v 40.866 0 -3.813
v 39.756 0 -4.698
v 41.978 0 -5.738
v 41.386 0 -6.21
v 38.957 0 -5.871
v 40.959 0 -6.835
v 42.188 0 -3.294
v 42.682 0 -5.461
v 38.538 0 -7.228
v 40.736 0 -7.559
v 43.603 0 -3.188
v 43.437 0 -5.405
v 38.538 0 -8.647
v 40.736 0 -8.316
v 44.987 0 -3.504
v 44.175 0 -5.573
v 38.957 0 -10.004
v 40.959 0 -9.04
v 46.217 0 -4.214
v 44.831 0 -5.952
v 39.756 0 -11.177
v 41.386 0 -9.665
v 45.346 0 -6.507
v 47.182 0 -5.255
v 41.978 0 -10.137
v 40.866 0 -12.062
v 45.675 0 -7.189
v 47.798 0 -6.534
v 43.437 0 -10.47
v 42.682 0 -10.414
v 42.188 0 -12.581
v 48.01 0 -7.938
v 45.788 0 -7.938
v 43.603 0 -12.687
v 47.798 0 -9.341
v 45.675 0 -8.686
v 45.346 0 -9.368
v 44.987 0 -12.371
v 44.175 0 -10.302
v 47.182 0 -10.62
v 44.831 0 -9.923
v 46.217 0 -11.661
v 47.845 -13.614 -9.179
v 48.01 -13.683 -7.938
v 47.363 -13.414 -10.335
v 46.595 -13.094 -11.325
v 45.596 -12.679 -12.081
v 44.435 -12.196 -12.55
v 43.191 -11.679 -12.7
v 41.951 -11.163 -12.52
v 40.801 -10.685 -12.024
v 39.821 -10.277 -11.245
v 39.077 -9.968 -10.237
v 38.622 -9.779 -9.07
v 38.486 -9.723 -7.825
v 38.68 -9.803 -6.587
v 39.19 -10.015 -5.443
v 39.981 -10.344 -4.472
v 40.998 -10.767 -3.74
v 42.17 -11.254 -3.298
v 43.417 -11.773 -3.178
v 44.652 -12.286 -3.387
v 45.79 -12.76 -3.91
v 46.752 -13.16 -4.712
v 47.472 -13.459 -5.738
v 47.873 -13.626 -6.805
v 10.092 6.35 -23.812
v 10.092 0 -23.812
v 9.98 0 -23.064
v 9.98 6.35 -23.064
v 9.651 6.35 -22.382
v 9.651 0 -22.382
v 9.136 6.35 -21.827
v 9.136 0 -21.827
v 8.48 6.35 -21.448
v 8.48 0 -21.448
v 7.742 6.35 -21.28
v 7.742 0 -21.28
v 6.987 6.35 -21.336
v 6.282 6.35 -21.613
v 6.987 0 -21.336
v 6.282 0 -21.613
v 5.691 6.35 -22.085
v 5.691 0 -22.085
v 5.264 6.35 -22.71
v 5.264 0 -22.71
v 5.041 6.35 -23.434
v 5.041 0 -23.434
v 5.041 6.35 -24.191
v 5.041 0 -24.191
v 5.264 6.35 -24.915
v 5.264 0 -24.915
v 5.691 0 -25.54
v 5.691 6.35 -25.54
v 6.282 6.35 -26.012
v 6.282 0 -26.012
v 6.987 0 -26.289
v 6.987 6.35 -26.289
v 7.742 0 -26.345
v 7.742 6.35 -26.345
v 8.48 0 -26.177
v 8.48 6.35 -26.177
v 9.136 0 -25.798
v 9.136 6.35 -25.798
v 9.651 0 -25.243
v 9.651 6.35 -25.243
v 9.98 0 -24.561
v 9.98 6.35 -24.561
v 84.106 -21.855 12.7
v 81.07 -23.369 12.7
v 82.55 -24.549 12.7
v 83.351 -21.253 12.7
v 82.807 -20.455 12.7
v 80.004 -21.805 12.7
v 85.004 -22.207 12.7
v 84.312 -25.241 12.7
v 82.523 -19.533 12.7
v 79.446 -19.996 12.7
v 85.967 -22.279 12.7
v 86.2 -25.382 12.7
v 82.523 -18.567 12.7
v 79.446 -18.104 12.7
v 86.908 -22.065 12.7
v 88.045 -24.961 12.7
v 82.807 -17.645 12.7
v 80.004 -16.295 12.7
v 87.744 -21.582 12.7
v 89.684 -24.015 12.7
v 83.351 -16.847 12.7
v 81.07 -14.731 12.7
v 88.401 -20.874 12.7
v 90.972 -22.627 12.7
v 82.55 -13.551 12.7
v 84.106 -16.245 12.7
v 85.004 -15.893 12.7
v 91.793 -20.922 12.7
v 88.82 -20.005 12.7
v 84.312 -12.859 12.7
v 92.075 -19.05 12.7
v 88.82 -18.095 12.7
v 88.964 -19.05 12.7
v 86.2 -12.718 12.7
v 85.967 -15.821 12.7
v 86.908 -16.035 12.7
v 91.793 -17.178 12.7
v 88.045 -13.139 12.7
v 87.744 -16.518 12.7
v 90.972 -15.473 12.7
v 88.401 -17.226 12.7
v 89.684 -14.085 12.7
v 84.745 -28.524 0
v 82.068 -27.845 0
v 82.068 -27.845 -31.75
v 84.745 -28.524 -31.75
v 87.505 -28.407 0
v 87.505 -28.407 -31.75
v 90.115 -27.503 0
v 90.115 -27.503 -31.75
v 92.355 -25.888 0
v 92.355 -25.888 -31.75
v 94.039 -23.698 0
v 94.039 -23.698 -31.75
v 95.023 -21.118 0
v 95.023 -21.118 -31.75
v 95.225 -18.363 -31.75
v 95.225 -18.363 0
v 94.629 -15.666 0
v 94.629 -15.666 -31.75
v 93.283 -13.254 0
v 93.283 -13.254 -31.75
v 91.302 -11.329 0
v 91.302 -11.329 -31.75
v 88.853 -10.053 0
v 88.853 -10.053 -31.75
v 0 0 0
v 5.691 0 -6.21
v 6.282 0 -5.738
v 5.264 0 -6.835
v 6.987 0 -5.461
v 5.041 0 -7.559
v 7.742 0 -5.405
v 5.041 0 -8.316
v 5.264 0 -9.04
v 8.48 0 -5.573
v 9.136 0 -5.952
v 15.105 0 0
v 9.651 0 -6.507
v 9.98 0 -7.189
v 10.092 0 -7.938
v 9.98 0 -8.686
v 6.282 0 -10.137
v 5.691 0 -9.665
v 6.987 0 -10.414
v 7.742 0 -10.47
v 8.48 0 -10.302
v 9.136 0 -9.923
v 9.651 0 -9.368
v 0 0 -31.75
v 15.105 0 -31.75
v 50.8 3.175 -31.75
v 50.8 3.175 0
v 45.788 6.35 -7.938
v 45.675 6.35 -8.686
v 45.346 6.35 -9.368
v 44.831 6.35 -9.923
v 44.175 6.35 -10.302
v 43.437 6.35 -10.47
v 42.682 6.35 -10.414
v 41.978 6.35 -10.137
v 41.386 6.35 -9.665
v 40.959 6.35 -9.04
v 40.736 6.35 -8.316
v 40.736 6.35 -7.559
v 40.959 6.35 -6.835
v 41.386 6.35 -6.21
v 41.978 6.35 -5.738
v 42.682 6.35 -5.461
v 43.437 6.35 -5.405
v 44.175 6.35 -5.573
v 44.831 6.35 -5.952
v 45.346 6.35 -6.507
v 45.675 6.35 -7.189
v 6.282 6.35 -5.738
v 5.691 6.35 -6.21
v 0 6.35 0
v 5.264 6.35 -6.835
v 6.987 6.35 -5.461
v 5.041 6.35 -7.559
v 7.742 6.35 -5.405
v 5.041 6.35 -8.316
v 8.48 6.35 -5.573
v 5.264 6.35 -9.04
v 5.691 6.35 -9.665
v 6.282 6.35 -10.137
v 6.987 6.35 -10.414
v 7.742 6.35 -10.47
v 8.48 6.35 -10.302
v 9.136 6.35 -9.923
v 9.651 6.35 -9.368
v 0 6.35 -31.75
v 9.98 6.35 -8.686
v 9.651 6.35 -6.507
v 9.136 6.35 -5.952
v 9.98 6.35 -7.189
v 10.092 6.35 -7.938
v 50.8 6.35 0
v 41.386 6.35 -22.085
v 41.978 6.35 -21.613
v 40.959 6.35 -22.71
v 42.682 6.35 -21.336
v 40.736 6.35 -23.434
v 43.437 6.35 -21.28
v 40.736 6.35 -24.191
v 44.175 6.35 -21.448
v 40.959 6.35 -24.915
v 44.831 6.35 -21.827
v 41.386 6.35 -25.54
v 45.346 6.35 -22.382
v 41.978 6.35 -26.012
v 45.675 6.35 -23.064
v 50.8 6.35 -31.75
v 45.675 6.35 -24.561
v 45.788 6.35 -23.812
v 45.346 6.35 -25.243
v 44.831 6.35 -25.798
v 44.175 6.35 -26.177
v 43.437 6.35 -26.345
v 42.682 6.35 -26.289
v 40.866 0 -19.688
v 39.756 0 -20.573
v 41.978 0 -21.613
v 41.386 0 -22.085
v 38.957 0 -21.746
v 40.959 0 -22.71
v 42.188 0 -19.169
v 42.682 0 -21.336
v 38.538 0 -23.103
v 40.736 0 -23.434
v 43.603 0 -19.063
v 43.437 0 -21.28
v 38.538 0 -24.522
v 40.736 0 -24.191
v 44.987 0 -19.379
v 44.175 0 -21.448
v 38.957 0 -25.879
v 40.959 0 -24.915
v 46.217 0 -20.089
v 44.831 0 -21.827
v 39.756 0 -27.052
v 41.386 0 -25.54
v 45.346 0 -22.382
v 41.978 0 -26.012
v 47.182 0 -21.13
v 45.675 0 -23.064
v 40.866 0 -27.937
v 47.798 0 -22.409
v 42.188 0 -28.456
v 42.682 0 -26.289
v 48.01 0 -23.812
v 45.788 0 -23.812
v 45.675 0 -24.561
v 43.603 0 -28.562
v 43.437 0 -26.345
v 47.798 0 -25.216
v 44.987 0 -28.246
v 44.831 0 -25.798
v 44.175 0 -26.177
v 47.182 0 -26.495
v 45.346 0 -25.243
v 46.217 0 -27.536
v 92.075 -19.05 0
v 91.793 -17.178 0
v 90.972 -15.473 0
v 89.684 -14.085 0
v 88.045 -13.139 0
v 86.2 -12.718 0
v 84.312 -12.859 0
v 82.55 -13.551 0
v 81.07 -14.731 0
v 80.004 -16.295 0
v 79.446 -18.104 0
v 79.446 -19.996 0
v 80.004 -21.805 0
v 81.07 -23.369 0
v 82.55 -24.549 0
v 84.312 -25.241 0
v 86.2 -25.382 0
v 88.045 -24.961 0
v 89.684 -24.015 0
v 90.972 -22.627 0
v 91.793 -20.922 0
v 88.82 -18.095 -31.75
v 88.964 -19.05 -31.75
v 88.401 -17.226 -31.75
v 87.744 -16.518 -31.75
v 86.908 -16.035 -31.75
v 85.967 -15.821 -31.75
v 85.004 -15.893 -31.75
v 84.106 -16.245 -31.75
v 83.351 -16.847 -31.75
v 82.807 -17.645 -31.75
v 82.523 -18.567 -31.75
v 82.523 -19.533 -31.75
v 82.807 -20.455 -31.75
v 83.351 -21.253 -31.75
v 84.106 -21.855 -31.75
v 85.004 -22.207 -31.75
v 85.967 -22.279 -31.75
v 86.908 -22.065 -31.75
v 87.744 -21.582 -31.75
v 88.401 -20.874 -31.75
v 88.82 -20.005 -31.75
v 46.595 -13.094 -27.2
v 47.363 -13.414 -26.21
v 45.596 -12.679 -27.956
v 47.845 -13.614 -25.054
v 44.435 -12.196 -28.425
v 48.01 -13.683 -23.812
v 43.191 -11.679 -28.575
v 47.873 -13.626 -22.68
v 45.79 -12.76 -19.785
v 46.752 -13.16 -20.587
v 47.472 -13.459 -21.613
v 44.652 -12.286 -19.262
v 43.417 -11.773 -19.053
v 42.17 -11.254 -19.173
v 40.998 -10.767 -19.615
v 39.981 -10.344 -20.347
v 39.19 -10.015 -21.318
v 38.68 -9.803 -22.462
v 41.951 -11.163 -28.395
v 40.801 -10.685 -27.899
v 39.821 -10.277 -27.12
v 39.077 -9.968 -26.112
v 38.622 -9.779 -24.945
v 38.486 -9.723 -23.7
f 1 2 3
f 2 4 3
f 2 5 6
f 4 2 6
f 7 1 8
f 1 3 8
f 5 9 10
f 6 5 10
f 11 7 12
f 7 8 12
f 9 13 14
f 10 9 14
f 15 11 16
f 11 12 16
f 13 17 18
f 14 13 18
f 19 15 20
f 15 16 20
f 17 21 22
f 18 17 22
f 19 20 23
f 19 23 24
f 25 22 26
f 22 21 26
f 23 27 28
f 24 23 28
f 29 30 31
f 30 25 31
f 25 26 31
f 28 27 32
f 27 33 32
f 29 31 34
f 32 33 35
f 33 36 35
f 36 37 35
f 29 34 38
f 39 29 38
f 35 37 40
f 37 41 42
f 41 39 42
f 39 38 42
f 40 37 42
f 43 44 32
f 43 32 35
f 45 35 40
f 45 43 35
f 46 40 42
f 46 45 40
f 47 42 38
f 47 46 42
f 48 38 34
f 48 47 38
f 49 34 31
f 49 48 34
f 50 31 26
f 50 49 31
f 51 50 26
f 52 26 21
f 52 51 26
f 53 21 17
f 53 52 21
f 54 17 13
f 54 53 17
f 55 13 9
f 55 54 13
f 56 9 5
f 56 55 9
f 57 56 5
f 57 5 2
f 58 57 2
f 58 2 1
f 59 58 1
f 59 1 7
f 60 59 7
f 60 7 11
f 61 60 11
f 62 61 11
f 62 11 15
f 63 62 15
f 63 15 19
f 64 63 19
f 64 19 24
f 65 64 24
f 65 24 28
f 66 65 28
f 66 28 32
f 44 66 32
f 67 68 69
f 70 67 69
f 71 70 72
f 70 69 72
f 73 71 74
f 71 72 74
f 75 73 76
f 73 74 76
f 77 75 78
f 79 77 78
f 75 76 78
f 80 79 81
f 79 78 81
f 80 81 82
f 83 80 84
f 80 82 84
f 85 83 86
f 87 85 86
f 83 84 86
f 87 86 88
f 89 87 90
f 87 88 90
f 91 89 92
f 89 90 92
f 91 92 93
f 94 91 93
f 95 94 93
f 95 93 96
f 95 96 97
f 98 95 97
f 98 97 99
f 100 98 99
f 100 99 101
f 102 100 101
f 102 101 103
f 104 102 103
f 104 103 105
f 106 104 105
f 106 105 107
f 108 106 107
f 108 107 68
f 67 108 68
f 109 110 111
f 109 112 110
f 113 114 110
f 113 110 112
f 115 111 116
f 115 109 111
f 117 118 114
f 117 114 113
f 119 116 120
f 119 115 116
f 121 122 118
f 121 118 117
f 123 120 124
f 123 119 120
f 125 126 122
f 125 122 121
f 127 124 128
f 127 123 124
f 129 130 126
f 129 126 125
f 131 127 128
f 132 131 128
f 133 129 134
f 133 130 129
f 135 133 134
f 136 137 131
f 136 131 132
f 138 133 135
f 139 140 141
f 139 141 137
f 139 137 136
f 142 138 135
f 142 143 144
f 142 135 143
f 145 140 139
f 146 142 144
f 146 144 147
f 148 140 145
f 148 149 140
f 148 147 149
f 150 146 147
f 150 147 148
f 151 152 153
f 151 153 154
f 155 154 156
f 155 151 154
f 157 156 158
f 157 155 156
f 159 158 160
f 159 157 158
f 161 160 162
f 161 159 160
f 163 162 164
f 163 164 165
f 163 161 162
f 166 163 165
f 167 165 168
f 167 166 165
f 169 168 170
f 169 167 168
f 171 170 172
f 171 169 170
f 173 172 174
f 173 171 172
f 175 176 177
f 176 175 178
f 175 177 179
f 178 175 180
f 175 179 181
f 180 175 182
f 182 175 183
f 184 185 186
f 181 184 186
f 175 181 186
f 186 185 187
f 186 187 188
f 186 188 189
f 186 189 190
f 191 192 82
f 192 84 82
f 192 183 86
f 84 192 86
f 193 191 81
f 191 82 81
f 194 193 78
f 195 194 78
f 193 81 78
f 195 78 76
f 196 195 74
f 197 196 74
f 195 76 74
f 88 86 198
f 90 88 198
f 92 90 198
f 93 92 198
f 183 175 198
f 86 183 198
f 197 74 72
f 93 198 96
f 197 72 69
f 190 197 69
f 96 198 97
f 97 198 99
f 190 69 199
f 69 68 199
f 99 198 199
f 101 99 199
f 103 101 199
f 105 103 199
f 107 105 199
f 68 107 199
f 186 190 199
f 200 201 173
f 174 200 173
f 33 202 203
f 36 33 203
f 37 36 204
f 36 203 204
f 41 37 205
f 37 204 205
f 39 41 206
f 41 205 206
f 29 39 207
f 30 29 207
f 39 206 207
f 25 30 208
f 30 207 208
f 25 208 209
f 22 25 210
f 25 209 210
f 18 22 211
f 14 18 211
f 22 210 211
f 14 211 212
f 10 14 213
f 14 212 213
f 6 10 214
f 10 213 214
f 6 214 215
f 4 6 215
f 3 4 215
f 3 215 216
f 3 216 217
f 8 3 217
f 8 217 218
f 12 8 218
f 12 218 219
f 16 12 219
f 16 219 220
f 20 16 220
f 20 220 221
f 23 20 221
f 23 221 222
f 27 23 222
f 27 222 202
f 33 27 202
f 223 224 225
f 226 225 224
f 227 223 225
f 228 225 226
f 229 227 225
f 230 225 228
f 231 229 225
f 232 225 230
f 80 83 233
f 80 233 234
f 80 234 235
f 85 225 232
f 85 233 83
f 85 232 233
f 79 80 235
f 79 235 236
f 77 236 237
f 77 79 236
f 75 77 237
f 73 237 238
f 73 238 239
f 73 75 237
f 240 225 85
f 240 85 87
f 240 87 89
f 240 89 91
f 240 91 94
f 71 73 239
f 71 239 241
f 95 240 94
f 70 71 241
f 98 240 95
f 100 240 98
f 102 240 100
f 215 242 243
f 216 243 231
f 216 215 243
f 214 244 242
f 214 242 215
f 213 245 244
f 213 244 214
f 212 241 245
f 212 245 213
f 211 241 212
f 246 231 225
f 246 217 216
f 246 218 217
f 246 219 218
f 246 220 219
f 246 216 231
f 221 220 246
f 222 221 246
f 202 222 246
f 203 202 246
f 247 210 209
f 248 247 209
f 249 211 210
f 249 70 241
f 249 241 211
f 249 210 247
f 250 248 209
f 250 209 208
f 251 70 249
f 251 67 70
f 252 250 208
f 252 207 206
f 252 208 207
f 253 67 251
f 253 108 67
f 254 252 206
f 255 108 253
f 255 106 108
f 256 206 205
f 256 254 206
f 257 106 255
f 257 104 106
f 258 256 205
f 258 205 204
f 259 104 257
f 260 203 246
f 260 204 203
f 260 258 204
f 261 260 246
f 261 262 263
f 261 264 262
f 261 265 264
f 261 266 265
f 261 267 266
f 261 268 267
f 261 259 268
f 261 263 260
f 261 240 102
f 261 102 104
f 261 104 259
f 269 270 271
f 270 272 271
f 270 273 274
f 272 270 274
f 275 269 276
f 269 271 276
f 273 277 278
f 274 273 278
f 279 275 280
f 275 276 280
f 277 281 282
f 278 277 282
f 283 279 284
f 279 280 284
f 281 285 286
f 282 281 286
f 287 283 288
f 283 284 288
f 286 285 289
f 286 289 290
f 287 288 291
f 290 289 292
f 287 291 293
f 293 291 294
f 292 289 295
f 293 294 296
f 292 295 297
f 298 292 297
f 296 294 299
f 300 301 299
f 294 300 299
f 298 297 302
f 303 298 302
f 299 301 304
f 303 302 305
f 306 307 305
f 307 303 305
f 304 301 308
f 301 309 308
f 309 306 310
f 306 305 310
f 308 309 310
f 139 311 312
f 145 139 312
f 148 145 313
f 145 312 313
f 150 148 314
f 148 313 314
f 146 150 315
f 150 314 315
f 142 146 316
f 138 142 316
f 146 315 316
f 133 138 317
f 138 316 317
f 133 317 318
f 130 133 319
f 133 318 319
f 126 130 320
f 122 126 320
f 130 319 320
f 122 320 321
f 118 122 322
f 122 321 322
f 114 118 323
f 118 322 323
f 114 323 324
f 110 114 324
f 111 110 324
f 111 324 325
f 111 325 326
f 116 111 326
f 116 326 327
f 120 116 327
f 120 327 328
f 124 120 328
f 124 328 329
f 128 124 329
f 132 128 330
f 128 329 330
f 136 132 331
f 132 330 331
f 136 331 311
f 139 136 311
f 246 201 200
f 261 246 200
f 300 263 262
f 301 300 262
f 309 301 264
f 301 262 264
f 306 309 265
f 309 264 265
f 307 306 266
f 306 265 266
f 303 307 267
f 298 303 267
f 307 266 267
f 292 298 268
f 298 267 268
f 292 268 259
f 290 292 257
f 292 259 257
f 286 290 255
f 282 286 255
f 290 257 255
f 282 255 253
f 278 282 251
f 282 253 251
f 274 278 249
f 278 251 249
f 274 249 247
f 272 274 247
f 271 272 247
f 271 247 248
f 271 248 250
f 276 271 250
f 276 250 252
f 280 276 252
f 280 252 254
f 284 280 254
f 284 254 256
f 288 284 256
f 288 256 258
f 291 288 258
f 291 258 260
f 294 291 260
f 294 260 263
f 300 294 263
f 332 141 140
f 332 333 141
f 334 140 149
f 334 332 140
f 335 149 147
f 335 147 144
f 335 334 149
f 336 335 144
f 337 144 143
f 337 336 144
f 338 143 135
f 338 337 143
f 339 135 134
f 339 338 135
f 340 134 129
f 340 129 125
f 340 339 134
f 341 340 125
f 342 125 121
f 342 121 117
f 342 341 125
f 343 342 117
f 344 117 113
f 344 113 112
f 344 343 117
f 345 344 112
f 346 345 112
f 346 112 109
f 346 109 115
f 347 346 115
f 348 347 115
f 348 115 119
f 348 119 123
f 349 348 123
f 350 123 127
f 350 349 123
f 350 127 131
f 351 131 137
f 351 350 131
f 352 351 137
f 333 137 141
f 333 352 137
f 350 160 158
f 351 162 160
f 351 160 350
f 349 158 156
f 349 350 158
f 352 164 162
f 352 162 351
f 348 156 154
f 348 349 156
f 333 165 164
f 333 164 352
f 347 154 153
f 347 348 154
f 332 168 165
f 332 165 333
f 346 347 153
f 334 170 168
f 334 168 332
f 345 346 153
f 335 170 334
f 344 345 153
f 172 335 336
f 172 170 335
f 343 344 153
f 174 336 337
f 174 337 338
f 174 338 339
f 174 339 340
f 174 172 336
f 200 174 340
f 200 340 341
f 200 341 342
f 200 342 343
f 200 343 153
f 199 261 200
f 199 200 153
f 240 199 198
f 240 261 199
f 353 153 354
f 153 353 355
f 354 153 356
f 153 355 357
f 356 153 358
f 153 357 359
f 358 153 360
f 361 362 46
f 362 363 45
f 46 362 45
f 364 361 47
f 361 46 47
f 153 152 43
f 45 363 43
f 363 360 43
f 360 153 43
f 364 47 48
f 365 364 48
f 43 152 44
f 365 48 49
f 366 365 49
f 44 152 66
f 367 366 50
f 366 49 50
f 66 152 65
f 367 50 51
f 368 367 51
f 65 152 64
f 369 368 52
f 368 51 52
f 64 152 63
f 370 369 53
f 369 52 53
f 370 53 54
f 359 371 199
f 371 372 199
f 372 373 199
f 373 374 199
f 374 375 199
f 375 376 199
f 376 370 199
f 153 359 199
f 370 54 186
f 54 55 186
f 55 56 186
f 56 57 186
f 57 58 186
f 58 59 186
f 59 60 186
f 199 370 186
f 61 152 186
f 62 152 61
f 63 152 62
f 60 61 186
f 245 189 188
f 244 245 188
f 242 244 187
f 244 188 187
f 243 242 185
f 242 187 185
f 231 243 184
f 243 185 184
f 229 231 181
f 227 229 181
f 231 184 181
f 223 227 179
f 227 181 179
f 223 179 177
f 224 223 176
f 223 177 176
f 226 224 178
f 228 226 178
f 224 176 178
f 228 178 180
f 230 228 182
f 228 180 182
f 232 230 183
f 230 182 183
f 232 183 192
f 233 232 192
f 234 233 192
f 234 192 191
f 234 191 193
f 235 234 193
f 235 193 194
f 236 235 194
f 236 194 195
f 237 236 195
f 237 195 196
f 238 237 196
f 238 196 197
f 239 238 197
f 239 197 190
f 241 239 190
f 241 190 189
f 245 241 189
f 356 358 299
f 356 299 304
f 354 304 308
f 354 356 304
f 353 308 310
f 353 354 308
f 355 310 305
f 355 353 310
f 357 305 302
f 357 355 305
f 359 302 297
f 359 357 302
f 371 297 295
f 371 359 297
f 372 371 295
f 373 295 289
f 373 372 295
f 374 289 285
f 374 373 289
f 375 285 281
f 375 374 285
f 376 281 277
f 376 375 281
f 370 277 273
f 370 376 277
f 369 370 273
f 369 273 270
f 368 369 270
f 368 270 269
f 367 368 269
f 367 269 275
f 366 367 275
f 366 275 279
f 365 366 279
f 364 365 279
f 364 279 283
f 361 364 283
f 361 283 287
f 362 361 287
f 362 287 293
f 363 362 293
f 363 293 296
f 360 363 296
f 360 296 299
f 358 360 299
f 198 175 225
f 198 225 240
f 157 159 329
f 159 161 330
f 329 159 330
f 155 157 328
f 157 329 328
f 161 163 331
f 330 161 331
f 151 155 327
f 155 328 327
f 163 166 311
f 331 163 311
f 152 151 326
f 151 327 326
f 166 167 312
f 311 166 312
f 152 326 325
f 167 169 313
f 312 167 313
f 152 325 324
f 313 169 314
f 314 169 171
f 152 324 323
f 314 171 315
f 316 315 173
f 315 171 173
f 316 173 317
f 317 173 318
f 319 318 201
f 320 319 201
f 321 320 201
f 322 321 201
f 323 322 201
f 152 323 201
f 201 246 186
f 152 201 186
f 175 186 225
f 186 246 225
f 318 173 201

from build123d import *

# Parameters (mm, degrees)
SKETCH1_W           = 50.8
SKETCH1_H           = 31.75
BOSS_EXTRUDE1_DEPTH = 6.35
SKETCH2_R           = 9.525
SKETCH2_R_2         = 3.2385
BOSS_EXTRUDE2_DEPTH = 31.75
BOSS_EXTRUDE3_DEPTH = 31.75
SKETCH4_R           = 6.35
SKETCH4_R_2         = 3.2385
BOSS_EXTRUDE4_DEPTH = 12.7
CUT_EXTRUDE1_REACH  = 8.35
SKETCH5_R           = 2.54
SKETCH6_R           = 2.54
CUT_EXTRUDE2_DEPTH  = 35.925
SKETCH7_R           = 4.7625
CUT_EXTRUDE3_DEPTH  = 19.05


with BuildPart() as part:
    # Sketch1 → Boss-Extrude1 (new body)
    with BuildSketch(Plane(origin=(0, 0, 0), x_dir=(1, 0, 0), z_dir=(0, 1, 0))):
        with Locations((25.4, 15.875)):
            Rectangle(SKETCH1_W, SKETCH1_H)
    extrude(amount=BOSS_EXTRUDE1_DEPTH)



with BuildPart() as body_2:
    # Sketch2 → Boss-Extrude2 (new body)
    with BuildSketch(Plane.XY):
        with Locations((85.725, -19.05)):
            Circle(SKETCH2_R)
        with Locations((85.725, -19.05)):
            Circle(SKETCH2_R_2, mode=Mode.SUBTRACT)
    extrude(amount=-BOSS_EXTRUDE2_DEPTH)


with BuildPart() as part_1:
    add(part.part)

    add(body_2.part)  # Boss-Extrude3 merges body 2
    # Sketch3 → Boss-Extrude3 (add)
    with BuildSketch(Plane.XY):
        with BuildLine():
            Line((50.8, 3.175), (88.852564162, -10.05311346))
            ThreePointArc((88.852564162, -10.05311346), (76.82515217, -15.656132943), (82.067835176, -27.844928678))
            Line((82.067835176, -27.844928678), (15.104990042, 0))
            Line((15.104990042, 0), (15.104990042, 3.175))
            Line((15.104990042, 3.175), (50.8, 3.175))
        make_face()
    extrude(amount=-BOSS_EXTRUDE3_DEPTH)

    # Sketch4 → Boss-Extrude4 (add)
    with BuildSketch(Plane.XY):
        with Locations((85.725, -19.05)):
            Circle(SKETCH4_R)
        with Locations((85.725, -19.05)):
            Circle(SKETCH4_R_2, mode=Mode.SUBTRACT)
    extrude(amount=BOSS_EXTRUDE4_DEPTH)

    # Sketch5 → Cut-Extrude1 (cut, up to next)
    with BuildSketch(Plane.XZ, mode=Mode.PRIVATE) as cut_extrude1_sk1:
        with Locations((7.552495021, -7.9375)):
            Circle(SKETCH5_R)
    cut_extrude1_tool1 = extrude(cut_extrude1_sk1.sketch, amount=-CUT_EXTRUDE1_REACH, mode=Mode.PRIVATE) & part_1.part
    add(cut_extrude1_tool1.solids().sort_by_distance((7.552495, 0, -7.9375))[0], mode=Mode.SUBTRACT)
    # Sketch5 → Cut-Extrude1 (cut, up to next)
    with BuildSketch(Plane.XZ, mode=Mode.PRIVATE) as cut_extrude1_sk2:
        with Locations((7.552495021, -23.8125)):
            Circle(SKETCH5_R)
    cut_extrude1_tool2 = extrude(cut_extrude1_sk2.sketch, amount=-CUT_EXTRUDE1_REACH, mode=Mode.PRIVATE) & part_1.part
    add(cut_extrude1_tool2.solids().sort_by_distance((7.552495, 0, -23.8125))[0], mode=Mode.SUBTRACT)

    # Sketch6 → Cut-Extrude2 (cut, through all)
    with BuildSketch(Plane(origin=(0, 6.35, 0), x_dir=(1, 0, 0), z_dir=(0, 1, 0))):
        with Locations((43.247504979, 7.9375)):
            Circle(SKETCH6_R)
        with Locations((43.247504979, 23.8125)):
            Circle(SKETCH6_R)
    extrude(amount=-CUT_EXTRUDE2_DEPTH, mode=Mode.SUBTRACT)

    # Sketch7 → Cut-Extrude3 (cut)
    with BuildSketch(Plane(origin=(0, -19.05, 0), x_dir=(1, 0, 0), z_dir=(0, 1, 0))):
        with Locations((43.247504979, 23.8125)):
            Circle(SKETCH7_R)
        with Locations((43.247504979, 7.9375)):
            Circle(SKETCH7_R)
    extrude(amount=CUT_EXTRUDE3_DEPTH, mode=Mode.SUBTRACT)


solid = part_1.part
